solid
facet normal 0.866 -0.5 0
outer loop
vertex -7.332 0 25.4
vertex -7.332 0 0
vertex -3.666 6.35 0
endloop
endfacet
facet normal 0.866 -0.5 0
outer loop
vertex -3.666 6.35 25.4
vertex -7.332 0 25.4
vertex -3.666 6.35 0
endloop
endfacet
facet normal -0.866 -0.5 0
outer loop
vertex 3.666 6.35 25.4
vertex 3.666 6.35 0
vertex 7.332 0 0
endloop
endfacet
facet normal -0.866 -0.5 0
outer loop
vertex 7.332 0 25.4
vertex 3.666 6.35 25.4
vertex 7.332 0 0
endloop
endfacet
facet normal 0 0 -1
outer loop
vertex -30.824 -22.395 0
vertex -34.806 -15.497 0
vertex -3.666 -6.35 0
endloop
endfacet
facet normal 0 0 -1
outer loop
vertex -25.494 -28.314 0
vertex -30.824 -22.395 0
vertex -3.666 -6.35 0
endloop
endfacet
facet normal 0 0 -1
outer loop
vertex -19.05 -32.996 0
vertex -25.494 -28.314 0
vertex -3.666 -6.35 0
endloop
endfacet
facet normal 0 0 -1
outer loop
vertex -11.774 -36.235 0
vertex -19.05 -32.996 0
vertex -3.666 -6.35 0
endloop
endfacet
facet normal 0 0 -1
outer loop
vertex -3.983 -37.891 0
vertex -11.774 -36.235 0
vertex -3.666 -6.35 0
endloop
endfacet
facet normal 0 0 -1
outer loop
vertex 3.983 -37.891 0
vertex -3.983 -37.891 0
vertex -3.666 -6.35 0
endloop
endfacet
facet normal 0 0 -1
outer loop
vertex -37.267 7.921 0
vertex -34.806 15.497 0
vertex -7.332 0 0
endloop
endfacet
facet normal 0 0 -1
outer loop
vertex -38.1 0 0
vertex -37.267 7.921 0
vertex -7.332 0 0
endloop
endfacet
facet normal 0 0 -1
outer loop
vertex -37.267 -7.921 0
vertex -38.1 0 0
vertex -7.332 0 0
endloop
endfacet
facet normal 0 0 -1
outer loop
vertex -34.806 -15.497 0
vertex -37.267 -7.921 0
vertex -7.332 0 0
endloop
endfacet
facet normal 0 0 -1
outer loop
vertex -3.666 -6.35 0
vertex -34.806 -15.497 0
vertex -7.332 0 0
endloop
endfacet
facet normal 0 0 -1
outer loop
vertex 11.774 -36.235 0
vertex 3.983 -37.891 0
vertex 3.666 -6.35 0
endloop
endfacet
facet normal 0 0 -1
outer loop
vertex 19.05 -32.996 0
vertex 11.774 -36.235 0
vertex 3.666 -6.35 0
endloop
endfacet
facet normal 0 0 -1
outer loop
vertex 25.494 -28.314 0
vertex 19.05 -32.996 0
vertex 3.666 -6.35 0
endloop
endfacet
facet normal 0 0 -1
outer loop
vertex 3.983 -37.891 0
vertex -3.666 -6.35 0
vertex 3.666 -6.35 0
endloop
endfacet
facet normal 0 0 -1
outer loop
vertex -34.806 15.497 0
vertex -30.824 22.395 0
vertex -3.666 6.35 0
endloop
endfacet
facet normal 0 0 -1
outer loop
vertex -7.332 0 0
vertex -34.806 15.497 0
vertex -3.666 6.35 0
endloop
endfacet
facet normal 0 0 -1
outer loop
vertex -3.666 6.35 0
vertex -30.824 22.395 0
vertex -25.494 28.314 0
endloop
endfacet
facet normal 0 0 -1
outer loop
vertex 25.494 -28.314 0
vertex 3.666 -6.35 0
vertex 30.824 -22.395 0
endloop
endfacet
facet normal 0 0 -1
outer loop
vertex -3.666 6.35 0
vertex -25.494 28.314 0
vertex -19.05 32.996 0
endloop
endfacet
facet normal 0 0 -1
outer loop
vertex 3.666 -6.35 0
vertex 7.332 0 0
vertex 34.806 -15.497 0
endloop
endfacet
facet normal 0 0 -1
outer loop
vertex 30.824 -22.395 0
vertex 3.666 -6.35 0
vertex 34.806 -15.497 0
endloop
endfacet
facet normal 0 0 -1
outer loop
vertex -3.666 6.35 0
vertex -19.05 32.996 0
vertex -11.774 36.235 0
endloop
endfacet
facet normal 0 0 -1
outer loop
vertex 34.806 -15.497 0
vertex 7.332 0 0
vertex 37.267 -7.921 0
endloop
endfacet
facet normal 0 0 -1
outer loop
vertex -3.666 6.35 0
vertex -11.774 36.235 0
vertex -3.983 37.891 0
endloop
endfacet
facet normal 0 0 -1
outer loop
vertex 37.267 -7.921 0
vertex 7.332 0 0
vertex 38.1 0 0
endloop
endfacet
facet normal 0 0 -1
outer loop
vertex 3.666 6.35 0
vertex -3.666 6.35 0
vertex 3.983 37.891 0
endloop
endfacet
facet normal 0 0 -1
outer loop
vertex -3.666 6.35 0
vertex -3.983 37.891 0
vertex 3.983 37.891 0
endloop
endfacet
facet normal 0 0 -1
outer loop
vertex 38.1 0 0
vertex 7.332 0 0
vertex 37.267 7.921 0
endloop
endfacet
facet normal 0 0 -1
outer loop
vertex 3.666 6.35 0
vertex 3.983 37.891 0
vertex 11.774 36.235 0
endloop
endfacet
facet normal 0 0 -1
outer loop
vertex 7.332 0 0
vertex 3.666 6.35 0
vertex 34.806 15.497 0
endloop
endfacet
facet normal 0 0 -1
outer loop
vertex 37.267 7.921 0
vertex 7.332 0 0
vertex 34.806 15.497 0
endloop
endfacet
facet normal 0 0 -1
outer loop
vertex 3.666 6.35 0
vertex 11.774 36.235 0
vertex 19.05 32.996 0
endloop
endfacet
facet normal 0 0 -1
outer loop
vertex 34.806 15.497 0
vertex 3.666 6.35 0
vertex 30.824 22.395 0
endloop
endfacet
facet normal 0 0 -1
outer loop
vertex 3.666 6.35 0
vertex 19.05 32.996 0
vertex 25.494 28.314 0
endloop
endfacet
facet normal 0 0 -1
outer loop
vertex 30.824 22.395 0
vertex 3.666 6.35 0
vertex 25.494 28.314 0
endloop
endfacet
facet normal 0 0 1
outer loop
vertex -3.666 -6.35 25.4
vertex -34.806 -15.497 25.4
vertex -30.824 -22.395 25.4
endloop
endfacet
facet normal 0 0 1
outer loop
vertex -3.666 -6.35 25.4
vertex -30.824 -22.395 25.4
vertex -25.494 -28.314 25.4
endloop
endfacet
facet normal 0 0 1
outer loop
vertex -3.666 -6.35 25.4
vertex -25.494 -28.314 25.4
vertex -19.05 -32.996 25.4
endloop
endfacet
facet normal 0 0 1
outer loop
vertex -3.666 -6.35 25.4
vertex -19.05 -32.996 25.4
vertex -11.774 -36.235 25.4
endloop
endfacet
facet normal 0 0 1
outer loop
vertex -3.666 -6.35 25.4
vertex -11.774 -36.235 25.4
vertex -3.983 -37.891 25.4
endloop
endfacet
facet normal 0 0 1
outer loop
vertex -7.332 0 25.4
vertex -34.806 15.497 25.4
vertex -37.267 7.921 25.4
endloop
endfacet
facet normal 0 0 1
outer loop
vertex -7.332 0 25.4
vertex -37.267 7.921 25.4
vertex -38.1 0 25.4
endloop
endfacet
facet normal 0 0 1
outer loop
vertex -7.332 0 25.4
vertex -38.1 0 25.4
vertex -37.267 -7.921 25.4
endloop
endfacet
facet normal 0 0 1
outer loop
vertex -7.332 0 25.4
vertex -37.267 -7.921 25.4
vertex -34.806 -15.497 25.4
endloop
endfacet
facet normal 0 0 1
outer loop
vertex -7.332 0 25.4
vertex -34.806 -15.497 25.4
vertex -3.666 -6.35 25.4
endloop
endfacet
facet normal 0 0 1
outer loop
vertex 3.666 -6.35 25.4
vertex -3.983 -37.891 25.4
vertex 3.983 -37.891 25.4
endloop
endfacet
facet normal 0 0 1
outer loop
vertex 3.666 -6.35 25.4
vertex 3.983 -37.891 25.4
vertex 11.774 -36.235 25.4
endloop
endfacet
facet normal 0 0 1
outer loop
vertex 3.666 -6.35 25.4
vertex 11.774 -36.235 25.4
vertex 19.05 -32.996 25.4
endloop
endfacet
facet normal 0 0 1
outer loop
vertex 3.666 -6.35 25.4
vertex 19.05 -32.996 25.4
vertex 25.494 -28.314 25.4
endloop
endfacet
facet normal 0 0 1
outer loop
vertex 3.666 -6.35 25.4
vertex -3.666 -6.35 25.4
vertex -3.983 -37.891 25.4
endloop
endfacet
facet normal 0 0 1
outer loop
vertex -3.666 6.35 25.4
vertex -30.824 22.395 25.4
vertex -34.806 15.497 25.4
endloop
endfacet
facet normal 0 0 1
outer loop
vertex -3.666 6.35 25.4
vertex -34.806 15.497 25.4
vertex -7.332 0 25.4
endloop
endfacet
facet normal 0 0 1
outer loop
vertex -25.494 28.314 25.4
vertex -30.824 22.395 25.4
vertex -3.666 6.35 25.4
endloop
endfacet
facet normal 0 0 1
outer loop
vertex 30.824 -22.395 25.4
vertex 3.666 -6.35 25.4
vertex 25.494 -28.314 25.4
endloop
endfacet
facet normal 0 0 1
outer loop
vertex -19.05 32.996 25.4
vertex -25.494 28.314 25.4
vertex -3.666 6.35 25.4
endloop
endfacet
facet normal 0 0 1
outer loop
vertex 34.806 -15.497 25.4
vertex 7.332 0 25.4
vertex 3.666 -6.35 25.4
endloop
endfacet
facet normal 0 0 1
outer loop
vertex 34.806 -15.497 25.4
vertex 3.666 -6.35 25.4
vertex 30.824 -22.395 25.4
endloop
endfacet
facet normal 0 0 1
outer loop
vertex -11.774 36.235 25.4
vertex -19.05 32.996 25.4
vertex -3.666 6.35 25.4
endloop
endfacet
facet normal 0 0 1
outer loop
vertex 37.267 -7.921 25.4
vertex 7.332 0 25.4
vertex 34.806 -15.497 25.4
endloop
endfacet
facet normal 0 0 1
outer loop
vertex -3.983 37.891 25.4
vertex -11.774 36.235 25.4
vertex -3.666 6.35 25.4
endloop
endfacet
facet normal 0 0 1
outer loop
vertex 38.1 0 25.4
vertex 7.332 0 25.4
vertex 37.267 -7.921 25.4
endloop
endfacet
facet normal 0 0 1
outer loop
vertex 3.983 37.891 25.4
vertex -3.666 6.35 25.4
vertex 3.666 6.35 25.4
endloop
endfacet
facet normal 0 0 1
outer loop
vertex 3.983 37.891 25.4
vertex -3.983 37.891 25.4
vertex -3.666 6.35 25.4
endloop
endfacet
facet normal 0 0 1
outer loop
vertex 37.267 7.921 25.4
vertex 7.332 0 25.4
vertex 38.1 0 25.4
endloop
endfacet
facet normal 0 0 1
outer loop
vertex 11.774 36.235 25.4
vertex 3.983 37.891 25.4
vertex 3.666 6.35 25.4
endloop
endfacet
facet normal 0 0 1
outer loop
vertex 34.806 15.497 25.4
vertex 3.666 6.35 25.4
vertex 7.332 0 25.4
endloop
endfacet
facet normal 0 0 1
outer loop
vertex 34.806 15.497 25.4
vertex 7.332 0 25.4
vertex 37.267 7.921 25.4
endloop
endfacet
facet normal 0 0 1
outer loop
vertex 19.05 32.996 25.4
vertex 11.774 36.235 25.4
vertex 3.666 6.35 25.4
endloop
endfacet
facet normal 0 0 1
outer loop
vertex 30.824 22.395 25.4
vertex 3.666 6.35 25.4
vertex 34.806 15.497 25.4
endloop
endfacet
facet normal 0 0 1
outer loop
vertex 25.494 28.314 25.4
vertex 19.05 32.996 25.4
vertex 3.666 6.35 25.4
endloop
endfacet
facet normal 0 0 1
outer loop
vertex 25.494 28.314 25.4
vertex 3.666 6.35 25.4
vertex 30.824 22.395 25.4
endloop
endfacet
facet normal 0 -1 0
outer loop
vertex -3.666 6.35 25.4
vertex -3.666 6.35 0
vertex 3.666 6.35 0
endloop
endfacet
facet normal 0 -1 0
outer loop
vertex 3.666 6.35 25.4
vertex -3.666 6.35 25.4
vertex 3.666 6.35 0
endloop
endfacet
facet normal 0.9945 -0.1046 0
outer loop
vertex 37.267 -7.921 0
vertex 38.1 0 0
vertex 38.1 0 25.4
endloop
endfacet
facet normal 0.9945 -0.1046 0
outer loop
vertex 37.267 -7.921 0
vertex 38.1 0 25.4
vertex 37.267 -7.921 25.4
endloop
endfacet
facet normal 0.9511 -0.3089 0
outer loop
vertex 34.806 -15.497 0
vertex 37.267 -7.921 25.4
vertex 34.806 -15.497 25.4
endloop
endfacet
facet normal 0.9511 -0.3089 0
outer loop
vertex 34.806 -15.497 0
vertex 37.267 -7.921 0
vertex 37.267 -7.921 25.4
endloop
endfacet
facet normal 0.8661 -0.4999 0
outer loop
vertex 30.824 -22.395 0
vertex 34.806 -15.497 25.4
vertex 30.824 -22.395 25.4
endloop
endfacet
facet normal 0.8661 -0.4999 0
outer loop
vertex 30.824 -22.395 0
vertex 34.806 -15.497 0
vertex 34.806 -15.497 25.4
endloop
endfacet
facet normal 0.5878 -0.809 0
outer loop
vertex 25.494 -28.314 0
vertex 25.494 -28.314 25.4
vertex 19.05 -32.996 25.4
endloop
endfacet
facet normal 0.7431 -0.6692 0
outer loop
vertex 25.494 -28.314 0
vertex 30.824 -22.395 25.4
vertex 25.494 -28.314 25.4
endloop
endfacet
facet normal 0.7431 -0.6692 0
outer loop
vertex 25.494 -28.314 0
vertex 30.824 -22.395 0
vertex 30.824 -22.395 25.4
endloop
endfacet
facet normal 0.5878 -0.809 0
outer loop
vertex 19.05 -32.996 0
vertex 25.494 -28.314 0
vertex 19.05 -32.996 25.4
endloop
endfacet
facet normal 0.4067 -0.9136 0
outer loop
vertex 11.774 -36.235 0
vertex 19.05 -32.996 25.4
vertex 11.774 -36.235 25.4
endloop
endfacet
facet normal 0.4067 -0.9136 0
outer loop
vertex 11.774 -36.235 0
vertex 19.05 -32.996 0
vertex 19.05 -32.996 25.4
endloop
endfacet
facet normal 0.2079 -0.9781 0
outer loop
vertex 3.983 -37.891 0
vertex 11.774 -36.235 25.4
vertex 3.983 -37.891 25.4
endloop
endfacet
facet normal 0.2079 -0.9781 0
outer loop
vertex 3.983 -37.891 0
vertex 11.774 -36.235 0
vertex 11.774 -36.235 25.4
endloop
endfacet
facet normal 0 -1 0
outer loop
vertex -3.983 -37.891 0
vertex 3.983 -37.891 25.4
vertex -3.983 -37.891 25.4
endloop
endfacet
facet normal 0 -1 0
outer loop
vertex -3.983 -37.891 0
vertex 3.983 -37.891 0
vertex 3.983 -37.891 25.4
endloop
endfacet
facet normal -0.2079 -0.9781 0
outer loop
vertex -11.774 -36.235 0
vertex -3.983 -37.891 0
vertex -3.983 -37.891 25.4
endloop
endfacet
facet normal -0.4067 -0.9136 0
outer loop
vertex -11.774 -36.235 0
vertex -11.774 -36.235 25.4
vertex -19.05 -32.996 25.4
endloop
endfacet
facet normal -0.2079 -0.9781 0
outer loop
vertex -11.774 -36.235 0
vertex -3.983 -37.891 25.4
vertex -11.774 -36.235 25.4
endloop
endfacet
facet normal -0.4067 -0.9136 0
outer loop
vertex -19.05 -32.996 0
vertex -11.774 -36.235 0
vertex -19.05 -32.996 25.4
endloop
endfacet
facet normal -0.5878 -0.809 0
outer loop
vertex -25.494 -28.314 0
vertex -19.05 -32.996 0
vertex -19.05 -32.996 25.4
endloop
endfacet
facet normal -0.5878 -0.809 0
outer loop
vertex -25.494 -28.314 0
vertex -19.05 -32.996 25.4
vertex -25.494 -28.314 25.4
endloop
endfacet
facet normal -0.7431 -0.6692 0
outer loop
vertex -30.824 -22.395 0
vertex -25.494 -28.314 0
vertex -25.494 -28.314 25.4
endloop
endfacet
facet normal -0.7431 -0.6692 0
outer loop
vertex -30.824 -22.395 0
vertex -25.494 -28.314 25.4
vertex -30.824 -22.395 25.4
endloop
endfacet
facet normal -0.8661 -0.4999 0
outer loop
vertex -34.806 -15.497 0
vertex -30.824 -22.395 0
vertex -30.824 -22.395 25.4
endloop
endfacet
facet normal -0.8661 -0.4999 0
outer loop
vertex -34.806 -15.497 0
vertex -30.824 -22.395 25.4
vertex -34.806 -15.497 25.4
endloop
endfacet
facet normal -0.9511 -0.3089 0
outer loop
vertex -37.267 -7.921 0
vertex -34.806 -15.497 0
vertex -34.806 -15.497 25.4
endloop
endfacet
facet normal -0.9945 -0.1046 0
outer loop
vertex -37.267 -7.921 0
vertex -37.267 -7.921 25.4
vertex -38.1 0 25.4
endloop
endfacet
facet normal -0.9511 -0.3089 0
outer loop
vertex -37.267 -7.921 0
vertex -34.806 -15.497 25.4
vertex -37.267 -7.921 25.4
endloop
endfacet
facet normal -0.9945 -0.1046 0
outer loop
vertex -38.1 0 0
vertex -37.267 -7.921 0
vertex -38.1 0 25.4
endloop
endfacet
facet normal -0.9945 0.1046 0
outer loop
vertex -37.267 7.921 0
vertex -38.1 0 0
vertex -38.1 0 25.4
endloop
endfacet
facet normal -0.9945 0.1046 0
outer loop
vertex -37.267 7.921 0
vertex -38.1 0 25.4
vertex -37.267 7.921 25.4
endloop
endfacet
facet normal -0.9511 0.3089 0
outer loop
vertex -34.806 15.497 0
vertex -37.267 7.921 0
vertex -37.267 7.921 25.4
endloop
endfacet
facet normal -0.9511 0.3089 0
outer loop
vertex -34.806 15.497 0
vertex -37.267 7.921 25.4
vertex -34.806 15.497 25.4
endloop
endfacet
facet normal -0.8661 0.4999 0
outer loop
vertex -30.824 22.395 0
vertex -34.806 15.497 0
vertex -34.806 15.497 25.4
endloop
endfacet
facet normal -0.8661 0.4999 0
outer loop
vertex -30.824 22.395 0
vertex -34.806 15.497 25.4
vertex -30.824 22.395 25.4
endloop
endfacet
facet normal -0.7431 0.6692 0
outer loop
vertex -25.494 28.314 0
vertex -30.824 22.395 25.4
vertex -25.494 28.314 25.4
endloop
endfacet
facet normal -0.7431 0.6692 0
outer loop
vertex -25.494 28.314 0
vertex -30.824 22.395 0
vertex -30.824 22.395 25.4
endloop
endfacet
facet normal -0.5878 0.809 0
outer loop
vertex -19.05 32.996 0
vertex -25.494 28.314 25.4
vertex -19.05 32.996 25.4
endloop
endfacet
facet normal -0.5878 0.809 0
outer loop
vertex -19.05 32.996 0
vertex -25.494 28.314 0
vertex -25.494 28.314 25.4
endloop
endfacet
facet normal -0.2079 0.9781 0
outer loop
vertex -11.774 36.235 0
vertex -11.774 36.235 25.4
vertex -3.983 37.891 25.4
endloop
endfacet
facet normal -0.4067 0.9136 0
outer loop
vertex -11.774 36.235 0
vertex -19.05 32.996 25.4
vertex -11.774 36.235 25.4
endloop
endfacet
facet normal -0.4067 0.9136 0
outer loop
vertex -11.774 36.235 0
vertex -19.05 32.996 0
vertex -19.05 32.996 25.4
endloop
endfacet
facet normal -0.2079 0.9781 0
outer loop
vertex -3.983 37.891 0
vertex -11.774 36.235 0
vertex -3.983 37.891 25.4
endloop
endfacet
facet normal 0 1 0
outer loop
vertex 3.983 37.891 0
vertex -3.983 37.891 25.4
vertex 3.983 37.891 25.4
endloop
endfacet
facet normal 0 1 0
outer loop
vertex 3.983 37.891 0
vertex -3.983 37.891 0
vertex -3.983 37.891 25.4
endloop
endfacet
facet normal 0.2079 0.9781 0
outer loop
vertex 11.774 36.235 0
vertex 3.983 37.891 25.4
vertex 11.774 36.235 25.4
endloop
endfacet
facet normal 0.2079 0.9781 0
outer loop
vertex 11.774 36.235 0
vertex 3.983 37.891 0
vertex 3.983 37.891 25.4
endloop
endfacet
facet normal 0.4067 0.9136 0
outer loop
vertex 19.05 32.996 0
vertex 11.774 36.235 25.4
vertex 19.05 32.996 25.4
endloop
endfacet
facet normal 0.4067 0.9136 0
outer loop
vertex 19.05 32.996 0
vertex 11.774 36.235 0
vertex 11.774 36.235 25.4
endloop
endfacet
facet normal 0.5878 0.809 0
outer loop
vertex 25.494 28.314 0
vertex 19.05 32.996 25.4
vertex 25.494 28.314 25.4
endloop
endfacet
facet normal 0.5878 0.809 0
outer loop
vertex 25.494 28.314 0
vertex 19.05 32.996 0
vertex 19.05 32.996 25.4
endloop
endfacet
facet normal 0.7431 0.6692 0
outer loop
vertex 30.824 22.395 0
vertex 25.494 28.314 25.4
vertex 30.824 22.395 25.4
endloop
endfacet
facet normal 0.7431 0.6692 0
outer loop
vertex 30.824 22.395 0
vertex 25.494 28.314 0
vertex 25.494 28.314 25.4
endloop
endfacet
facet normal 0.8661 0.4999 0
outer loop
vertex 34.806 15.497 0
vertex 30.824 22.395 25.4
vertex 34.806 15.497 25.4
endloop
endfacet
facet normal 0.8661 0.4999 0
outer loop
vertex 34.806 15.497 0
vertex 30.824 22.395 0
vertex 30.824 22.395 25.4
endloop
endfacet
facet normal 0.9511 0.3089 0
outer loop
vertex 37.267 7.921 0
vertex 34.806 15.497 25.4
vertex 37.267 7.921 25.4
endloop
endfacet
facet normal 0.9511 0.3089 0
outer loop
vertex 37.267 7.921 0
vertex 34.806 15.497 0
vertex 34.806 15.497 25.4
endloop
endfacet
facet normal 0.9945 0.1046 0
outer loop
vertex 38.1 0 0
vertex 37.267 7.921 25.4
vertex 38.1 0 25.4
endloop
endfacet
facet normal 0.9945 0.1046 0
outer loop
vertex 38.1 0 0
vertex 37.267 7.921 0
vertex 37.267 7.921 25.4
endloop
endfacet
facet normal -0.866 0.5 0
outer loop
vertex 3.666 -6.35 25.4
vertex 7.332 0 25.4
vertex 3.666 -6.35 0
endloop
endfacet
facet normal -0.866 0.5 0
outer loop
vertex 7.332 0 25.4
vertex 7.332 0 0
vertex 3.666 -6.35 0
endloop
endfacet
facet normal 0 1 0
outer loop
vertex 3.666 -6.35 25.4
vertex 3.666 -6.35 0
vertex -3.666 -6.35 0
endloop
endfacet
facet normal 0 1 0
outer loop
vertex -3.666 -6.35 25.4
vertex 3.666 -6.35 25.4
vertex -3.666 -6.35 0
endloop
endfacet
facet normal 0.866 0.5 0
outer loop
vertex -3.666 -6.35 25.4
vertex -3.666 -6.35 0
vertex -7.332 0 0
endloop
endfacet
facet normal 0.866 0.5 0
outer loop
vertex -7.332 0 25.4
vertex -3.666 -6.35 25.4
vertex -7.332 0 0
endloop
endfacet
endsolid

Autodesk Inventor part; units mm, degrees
ref_plane "YZ Plane" through (0, 0, 0) normal (1, 0, 0) x (0, 1, 0)
ref_plane "XZ Plane" through (0, 0, 0) normal (0, 1, 0) x (-1, 0, 0)
ref_plane "XY Plane" through (0, 0, 0) normal (0, 0, 1) x (1, 0, 0)
sketch "Sketch1" plane through (0, 0, 0) normal (0, 0, 1) x (1, 0, 0)
  circle A0 centre (0, 0) radius 38.1
  line L0 (3.6662, 6.35) -> (7.3323, 0)
  line L1 (7.3323, 0) -> (3.6662, -6.35)
  line L2 (3.6662, -6.35) -> (-3.6662, -6.35)
  line L3 (-3.6662, -6.35) -> (-7.3323, 0)
  line L4 (-7.3323, 0) -> (-3.6662, 6.35)
  line L5 (-3.6662, 6.35) -> (3.6662, 6.35)
  line L6 (0, 0) -> (-13.8069, 0)
  dimension "d0" = 76.2
  dimension "d1" = 12.7
extrude "Extrusion1" add sketch "Sketch1" along normal blind 25.4
properties part number "Simple 3 in wheel"
